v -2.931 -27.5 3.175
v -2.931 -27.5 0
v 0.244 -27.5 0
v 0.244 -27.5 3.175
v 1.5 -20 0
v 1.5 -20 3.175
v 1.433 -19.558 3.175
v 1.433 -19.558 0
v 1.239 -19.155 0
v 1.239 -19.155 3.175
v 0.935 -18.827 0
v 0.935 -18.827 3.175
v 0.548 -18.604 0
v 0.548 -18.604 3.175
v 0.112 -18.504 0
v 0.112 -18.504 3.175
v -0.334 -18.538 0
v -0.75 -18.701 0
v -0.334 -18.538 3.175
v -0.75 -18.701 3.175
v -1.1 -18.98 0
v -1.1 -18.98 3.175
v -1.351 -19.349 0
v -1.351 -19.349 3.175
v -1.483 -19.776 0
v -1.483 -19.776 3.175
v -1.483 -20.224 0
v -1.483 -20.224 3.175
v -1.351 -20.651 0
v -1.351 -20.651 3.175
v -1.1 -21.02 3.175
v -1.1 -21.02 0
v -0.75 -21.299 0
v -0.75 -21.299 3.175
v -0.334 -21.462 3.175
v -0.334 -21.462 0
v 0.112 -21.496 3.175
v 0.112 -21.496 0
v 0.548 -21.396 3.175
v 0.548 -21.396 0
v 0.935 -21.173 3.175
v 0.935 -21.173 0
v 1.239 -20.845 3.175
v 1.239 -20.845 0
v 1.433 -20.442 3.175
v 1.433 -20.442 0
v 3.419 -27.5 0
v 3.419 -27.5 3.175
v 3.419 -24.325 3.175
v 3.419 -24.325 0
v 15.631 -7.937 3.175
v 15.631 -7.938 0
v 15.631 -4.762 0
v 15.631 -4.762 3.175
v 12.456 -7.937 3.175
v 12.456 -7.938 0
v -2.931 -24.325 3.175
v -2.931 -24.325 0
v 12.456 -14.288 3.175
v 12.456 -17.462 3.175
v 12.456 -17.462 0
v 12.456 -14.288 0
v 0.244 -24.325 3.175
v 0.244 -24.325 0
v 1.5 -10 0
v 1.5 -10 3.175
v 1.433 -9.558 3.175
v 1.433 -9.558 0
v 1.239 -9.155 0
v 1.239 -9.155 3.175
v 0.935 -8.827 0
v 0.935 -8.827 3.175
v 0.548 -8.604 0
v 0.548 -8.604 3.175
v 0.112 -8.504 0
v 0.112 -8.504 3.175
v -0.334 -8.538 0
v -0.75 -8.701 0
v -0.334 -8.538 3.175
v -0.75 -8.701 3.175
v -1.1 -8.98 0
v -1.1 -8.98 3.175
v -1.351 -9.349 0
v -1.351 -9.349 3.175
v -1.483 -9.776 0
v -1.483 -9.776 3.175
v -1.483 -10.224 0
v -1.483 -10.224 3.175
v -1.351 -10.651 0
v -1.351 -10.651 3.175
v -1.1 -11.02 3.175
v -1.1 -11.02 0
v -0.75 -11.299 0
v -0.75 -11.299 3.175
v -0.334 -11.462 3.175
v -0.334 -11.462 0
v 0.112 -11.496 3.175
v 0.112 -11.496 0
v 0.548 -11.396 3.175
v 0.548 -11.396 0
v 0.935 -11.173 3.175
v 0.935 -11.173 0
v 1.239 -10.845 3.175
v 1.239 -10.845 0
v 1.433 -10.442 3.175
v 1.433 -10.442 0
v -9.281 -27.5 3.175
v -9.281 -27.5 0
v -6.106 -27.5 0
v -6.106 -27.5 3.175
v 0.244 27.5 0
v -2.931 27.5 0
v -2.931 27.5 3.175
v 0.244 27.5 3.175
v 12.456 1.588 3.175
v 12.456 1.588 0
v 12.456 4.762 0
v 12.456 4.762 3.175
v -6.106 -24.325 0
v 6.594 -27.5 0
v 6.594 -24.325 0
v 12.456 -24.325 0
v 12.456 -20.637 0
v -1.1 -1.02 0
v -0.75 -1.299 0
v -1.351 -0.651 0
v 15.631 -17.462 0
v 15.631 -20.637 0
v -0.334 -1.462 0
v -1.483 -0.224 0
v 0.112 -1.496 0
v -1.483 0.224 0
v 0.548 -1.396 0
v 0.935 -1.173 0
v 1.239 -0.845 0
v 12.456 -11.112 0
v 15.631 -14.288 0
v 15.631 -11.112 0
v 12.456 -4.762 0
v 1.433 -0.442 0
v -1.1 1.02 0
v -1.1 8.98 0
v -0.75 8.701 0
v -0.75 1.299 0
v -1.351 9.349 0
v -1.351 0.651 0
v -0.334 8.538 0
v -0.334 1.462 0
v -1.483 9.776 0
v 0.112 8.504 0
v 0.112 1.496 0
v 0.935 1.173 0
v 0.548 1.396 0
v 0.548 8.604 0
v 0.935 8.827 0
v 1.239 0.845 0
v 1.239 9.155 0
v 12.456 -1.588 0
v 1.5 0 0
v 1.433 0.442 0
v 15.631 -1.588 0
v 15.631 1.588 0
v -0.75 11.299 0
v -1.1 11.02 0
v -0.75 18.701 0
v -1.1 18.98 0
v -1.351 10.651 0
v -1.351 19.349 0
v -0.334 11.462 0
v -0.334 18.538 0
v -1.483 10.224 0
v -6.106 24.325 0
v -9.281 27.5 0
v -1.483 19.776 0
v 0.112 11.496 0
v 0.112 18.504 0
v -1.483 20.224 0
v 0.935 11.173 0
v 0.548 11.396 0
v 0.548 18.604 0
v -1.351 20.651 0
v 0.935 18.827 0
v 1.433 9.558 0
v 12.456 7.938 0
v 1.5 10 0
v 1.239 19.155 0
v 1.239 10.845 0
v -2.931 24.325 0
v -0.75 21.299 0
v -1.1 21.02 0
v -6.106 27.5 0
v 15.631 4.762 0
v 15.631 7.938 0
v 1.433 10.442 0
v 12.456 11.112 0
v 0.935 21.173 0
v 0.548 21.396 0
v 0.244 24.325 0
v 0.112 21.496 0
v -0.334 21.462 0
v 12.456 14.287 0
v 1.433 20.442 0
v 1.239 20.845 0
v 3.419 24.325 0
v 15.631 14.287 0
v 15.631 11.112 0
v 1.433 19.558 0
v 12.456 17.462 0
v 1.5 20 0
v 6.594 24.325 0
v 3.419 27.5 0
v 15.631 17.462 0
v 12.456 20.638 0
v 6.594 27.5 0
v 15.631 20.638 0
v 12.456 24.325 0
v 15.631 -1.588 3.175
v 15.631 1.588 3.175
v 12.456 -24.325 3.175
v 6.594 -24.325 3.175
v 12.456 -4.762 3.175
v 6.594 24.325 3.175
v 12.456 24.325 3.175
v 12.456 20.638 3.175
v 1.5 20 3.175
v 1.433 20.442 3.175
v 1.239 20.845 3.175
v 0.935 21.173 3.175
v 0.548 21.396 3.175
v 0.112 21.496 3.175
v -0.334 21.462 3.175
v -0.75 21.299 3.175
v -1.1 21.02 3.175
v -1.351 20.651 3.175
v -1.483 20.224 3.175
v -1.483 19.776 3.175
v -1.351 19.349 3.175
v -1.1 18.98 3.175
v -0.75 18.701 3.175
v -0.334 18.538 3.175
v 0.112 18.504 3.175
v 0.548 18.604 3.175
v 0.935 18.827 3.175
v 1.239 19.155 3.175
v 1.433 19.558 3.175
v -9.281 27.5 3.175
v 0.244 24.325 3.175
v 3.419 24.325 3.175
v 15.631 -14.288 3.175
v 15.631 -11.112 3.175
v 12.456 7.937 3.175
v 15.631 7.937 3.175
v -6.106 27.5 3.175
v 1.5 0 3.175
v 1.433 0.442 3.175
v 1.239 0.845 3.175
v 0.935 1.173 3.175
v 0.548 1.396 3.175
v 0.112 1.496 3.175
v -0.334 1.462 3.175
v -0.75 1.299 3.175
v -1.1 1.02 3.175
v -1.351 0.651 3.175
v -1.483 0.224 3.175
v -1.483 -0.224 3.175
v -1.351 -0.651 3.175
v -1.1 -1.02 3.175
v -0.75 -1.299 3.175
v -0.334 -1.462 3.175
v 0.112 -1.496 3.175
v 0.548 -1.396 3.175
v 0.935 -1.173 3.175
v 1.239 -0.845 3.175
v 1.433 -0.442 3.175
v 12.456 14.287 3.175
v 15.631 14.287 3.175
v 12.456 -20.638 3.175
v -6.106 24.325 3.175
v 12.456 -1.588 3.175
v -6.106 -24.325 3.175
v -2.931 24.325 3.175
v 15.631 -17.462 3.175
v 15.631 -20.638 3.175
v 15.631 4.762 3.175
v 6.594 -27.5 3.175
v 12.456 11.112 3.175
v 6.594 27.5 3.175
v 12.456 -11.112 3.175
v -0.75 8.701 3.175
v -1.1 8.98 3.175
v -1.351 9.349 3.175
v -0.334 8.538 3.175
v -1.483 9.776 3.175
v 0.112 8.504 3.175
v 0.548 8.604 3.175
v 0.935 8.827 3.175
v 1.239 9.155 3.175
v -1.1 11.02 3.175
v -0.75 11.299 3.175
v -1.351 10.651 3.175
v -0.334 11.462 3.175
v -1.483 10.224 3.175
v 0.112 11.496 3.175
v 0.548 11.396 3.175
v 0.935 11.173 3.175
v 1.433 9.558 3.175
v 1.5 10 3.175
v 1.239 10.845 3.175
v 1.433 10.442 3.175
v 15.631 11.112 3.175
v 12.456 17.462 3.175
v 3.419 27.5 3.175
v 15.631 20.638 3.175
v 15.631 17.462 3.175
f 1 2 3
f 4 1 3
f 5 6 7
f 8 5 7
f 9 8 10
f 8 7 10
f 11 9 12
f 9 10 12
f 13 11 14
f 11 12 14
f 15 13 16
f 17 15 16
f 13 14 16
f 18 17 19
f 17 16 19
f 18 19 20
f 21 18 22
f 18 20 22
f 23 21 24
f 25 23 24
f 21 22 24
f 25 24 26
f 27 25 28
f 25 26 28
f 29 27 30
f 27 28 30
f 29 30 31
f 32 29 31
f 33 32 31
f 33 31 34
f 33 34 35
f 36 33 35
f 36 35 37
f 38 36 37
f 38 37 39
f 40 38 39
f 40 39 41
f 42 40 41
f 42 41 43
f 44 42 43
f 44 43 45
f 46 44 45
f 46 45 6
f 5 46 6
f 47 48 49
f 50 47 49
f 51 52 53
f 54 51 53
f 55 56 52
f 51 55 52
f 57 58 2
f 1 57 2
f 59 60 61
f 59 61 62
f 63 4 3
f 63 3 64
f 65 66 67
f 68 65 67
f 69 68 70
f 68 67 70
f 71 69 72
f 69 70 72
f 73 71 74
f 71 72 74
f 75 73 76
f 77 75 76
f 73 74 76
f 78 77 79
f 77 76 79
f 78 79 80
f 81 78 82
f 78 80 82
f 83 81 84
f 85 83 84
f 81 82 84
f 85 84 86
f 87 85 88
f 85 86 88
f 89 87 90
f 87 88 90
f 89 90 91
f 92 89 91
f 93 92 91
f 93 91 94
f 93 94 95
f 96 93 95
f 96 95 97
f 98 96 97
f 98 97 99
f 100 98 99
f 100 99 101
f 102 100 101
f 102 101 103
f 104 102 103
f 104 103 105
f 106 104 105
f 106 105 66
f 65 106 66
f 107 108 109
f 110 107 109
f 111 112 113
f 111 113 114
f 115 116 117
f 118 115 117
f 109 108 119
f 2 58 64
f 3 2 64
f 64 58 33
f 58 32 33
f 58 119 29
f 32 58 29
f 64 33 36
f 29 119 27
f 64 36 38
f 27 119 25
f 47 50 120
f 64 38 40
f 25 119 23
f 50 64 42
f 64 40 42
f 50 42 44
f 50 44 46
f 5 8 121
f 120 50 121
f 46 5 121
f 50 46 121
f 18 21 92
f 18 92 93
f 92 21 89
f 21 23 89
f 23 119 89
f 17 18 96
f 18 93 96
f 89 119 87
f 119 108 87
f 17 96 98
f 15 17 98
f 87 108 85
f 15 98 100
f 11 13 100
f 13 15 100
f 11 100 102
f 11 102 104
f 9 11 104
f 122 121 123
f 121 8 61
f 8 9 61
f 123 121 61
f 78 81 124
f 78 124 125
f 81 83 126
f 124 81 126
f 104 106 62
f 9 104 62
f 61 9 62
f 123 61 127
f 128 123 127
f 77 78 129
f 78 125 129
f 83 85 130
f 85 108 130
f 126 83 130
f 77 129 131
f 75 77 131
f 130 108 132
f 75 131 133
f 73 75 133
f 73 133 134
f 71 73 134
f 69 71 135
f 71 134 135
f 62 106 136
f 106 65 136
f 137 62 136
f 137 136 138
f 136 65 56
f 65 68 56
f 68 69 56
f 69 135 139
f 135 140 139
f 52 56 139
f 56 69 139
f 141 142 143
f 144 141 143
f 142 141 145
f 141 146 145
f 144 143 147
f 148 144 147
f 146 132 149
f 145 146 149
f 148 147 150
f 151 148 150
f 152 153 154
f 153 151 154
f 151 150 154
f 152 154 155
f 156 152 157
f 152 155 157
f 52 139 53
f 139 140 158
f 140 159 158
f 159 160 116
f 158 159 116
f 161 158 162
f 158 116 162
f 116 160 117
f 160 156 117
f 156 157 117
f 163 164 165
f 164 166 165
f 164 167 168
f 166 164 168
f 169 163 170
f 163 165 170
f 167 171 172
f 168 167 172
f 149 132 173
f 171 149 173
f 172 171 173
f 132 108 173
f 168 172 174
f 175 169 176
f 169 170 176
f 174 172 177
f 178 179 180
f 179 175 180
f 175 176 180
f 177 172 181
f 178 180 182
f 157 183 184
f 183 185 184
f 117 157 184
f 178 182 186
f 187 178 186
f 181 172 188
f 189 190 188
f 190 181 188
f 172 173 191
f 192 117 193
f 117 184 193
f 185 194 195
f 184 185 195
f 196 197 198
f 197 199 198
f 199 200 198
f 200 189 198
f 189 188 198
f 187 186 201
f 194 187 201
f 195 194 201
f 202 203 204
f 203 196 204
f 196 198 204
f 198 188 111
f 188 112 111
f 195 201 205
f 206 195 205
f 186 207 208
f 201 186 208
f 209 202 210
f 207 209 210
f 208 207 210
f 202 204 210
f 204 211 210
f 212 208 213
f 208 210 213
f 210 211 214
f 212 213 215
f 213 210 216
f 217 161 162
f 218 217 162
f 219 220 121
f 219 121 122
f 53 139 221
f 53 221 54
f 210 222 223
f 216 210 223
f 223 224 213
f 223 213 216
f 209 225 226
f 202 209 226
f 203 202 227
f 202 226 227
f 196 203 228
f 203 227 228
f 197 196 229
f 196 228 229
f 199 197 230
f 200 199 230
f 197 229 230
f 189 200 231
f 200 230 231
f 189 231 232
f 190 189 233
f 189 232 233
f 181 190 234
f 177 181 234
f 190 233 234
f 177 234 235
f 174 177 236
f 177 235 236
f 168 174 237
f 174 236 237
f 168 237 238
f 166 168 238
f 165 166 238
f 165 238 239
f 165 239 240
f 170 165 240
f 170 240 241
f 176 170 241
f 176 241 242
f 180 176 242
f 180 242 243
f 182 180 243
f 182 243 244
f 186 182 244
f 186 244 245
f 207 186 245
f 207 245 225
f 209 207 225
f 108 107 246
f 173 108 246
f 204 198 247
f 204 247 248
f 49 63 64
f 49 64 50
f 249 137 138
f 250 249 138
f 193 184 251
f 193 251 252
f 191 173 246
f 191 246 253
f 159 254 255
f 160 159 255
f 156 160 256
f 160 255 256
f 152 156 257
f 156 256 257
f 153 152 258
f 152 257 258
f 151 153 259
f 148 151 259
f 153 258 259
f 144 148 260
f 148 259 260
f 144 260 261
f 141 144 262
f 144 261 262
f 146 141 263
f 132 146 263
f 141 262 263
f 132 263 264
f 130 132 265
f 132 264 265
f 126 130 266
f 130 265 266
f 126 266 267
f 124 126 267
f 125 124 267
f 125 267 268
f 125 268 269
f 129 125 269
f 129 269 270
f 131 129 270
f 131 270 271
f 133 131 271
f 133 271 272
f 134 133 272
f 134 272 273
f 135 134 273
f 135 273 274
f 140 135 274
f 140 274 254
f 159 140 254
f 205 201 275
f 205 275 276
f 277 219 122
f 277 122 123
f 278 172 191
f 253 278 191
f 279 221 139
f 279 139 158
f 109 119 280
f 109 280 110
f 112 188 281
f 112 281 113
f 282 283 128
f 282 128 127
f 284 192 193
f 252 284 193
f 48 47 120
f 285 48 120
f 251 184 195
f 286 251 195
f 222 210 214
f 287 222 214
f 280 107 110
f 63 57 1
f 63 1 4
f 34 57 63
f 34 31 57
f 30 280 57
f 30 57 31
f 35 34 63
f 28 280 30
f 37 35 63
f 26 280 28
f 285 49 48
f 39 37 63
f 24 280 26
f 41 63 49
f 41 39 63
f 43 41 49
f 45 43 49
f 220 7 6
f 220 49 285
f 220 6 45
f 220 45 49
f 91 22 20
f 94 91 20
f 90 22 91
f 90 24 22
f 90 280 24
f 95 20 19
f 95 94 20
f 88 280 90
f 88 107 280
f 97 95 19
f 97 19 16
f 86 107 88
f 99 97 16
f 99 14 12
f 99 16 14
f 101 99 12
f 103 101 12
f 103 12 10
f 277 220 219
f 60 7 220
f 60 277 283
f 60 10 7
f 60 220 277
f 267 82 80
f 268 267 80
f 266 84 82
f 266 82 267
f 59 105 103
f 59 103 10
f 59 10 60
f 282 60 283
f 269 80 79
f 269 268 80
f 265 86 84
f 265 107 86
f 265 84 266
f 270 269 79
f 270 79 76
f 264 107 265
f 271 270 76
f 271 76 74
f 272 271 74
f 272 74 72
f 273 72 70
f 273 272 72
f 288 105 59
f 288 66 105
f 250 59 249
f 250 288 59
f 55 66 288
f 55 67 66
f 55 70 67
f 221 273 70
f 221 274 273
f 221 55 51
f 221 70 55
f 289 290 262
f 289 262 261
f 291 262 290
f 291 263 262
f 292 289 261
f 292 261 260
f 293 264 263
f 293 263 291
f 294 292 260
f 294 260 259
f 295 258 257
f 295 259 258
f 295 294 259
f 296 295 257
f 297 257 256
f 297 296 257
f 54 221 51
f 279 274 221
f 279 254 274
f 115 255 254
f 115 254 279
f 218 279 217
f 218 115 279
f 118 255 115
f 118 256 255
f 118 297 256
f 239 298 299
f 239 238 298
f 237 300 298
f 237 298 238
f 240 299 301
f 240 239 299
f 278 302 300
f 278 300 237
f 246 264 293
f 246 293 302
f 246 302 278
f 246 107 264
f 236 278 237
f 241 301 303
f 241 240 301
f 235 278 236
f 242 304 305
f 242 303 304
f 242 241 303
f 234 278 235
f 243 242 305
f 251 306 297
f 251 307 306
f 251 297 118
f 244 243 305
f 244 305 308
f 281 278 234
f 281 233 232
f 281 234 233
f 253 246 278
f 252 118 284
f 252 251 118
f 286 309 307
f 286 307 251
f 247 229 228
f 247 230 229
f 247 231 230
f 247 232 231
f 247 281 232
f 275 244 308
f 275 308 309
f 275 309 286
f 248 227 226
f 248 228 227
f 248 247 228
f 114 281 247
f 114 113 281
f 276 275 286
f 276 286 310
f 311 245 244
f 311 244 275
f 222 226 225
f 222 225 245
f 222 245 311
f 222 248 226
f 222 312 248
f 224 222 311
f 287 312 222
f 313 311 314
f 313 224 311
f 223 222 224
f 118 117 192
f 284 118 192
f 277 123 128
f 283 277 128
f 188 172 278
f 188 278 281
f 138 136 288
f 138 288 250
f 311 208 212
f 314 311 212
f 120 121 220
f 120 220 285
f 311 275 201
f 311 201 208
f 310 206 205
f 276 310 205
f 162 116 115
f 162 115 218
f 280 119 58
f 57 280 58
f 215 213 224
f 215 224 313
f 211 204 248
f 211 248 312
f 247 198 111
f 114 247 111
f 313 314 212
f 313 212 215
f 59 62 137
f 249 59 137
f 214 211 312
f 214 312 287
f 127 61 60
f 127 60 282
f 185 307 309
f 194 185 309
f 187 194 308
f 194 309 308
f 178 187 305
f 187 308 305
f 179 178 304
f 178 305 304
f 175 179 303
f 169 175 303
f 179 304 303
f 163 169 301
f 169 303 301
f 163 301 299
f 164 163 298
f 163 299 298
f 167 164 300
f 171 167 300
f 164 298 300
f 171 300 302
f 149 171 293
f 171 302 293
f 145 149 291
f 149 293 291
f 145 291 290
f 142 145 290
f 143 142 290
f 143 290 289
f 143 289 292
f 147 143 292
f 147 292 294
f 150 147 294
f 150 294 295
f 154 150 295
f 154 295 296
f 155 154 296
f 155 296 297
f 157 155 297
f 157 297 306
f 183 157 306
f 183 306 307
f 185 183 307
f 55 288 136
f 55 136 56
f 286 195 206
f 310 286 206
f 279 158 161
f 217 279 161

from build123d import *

# Parameters (mm, degrees)
SKETCH1_W               = 31.2625
SKETCH1_H               = 55
BOSS_EXTRUDE1_DEPTH     = 3.175
SKETCH2_R               = 1.5
CUT_EXTRUDE1_DEPTH      = 10
LPATTERN1_COUNT         = 3
LPATTERN1_PITCH         = 10
LPATTERN1_COL_COUNT     = 3
LPATTERN1_COL_PITCH     = 10
SKETCH3_W               = 6.35
SKETCH3_H               = 3.175
CUT_EXTRUDE2_DEPTH      = 10
LPATTERN2_COUNT         = 5
LPATTERN2_PITCH         = 6.35
LPATTERN2_COL_COUNT     = 5
LPATTERN2_COL_PITCH     = 6.35
SKETCH4_W               = 3.175
SKETCH4_H               = 3.6875
SKETCH4_H_2             = 3.175
CUT_EXTRUDE3_DEPTH      = 10
SKETCH5_W               = 6.35
SKETCH5_H               = 55
CUT_EXTRUDE4_DEPTH      = 10
SKETCH6_W               = 3.175
SKETCH6_H               = 3.175
CUT_EXTRUDE5_DEPTH      = 10
LPATTERN3_COUNT         = 2
LPATTERN3_PITCH         = 6.35
LPATTERN3_COUNT_DIR2    = 2
LPATTERN3_PITCH_DIR2    = 6.35
SKETCH7_W               = 5.8625
SKETCH7_H               = 3.175
CUT_EXTRUDE6_DEPTH      = 10
MIRROR1_COPY_1_SKETCH_W = 3.175
MIRROR1_COPY_1_SKETCH_H = 3.175
MIRROR1_COPY_1_DEPTH    = 10
MIRROR1_COPY_2_SKETCH_W = 3.175
MIRROR1_COPY_2_SKETCH_H = 3.175
MIRROR1_COPY_2_DEPTH    = 10
MIRROR1_COPY_3_SKETCH_W = 3.175
MIRROR1_COPY_3_SKETCH_H = 3.175
MIRROR1_COPY_3_DEPTH    = 10


with BuildPart() as part:
    # Sketch1 → Boss-Extrude1 (new body)
    with BuildSketch(Plane.XY):
        Rectangle(SKETCH1_W, SKETCH1_H)
    extrude(amount=BOSS_EXTRUDE1_DEPTH)

    # Sketch2 → Cut-Extrude1 (cut)
    with BuildSketch(Plane.XY.offset(3.175)):
        Circle(SKETCH2_R)
    cut_extrude1 = extrude(amount=-CUT_EXTRUDE1_DEPTH, mode=Mode.SUBTRACT)

    # LPattern1: Cut-Extrude1 ×3
    with Locations(*[(0, i * LPATTERN1_PITCH, 0) for i in range(1, LPATTERN1_COUNT)]):
        add(cut_extrude1, mode=Mode.SUBTRACT)

    # LPattern1 col: Cut-Extrude1 ×3
    with Locations(*[(0, -i * LPATTERN1_COL_PITCH, 0) for i in range(1, LPATTERN1_COL_COUNT)]):
        add(cut_extrude1, mode=Mode.SUBTRACT)

    # Sketch3 → Cut-Extrude2 (cut)
    with BuildSketch(Plane.XY.offset(3.175)):
        with Locations((15.63125, -3.175)):
            Rectangle(SKETCH3_W, SKETCH3_H)
    cut_extrude2 = extrude(amount=-CUT_EXTRUDE2_DEPTH, mode=Mode.SUBTRACT)

    # LPattern2: Cut-Extrude2 ×5
    with Locations(*[(0, i * LPATTERN2_PITCH, 0) for i in range(1, LPATTERN2_COUNT)]):
        add(cut_extrude2, mode=Mode.SUBTRACT)

    # LPattern2 col: Cut-Extrude2 ×5
    with Locations(*[(0, -i * LPATTERN2_COL_PITCH, 0) for i in range(1, LPATTERN2_COL_COUNT)]):
        add(cut_extrude2, mode=Mode.SUBTRACT)

    # Sketch4 → Cut-Extrude3 (cut)
    with BuildSketch(Plane.XY.offset(3.175)):
        with Locations((14.04375, 25.65625)):
            Rectangle(SKETCH4_W, SKETCH4_H)
        with Locations((14.04375, -25.4)):
            Rectangle(SKETCH4_W, SKETCH4_H_2)
    extrude(amount=-CUT_EXTRUDE3_DEPTH, mode=Mode.SUBTRACT)

    # Sketch5 → Cut-Extrude4 (cut)
    with BuildSketch(Plane.XY.offset(3.175)):
        with Locations((-12.45625, 0)):
            Rectangle(SKETCH5_W, SKETCH5_H)
    extrude(amount=-CUT_EXTRUDE4_DEPTH, mode=Mode.SUBTRACT)

    # Sketch6 → Cut-Extrude5 (cut)
    with BuildSketch(Plane.XY.offset(3.175)):
        with Locations((-4.51875, 25.9125)):
            Rectangle(SKETCH6_W, SKETCH6_H)
    cut_extrude5 = extrude(amount=-CUT_EXTRUDE5_DEPTH, mode=Mode.SUBTRACT)

    # LPattern3: Cut-Extrude5 2 × 2
    with Locations(*[(i * LPATTERN3_PITCH, j * LPATTERN3_PITCH_DIR2, 0) for i in range(LPATTERN3_COUNT) for j in range(LPATTERN3_COUNT_DIR2) if (i, j) != (0, 0)]):
        add(cut_extrude5, mode=Mode.SUBTRACT)

    # Sketch7 → Cut-Extrude6 (cut)
    with BuildSketch(Plane.XY.offset(3.175)):
        with Locations((9.525, 25.9125)):
            Rectangle(SKETCH7_W, SKETCH7_H)
    cut_extrude6 = extrude(amount=-CUT_EXTRUDE6_DEPTH, mode=Mode.SUBTRACT)

    # Mirror1: Cut-Extrude5, Cut-Extrude6 across plane
    add(cut_extrude5.mirror(Plane.ZX), mode=Mode.SUBTRACT)
    add(cut_extrude6.mirror(Plane.ZX), mode=Mode.SUBTRACT)

    # Mirror1 copy 1 sketch → Mirror1 copy 1 (cut)
    with BuildSketch(Plane(origin=(0, -6.35, 3.175), x_dir=(1, 0, 0), z_dir=(0, 0, 1))):
        with Locations((-4.51875, -25.9125)):
            Rectangle(MIRROR1_COPY_1_SKETCH_W, MIRROR1_COPY_1_SKETCH_H)
    extrude(amount=-MIRROR1_COPY_1_DEPTH, mode=Mode.SUBTRACT)

    # Mirror1 copy 2 sketch → Mirror1 copy 2 (cut)
    with BuildSketch(Plane(origin=(6.35, 0, 3.175), x_dir=(1, 0, 0), z_dir=(0, 0, 1))):
        with Locations((-4.51875, -25.9125)):
            Rectangle(MIRROR1_COPY_2_SKETCH_W, MIRROR1_COPY_2_SKETCH_H)
    extrude(amount=-MIRROR1_COPY_2_DEPTH, mode=Mode.SUBTRACT)

    # Mirror1 copy 3 sketch → Mirror1 copy 3 (cut)
    with BuildSketch(Plane(origin=(6.35, -6.35, 3.175), x_dir=(1, 0, 0), z_dir=(0, 0, 1))):
        with Locations((-4.51875, -25.9125)):
            Rectangle(MIRROR1_COPY_3_SKETCH_W, MIRROR1_COPY_3_SKETCH_H)
    extrude(amount=-MIRROR1_COPY_3_DEPTH, mode=Mode.SUBTRACT)


solid = part.part
